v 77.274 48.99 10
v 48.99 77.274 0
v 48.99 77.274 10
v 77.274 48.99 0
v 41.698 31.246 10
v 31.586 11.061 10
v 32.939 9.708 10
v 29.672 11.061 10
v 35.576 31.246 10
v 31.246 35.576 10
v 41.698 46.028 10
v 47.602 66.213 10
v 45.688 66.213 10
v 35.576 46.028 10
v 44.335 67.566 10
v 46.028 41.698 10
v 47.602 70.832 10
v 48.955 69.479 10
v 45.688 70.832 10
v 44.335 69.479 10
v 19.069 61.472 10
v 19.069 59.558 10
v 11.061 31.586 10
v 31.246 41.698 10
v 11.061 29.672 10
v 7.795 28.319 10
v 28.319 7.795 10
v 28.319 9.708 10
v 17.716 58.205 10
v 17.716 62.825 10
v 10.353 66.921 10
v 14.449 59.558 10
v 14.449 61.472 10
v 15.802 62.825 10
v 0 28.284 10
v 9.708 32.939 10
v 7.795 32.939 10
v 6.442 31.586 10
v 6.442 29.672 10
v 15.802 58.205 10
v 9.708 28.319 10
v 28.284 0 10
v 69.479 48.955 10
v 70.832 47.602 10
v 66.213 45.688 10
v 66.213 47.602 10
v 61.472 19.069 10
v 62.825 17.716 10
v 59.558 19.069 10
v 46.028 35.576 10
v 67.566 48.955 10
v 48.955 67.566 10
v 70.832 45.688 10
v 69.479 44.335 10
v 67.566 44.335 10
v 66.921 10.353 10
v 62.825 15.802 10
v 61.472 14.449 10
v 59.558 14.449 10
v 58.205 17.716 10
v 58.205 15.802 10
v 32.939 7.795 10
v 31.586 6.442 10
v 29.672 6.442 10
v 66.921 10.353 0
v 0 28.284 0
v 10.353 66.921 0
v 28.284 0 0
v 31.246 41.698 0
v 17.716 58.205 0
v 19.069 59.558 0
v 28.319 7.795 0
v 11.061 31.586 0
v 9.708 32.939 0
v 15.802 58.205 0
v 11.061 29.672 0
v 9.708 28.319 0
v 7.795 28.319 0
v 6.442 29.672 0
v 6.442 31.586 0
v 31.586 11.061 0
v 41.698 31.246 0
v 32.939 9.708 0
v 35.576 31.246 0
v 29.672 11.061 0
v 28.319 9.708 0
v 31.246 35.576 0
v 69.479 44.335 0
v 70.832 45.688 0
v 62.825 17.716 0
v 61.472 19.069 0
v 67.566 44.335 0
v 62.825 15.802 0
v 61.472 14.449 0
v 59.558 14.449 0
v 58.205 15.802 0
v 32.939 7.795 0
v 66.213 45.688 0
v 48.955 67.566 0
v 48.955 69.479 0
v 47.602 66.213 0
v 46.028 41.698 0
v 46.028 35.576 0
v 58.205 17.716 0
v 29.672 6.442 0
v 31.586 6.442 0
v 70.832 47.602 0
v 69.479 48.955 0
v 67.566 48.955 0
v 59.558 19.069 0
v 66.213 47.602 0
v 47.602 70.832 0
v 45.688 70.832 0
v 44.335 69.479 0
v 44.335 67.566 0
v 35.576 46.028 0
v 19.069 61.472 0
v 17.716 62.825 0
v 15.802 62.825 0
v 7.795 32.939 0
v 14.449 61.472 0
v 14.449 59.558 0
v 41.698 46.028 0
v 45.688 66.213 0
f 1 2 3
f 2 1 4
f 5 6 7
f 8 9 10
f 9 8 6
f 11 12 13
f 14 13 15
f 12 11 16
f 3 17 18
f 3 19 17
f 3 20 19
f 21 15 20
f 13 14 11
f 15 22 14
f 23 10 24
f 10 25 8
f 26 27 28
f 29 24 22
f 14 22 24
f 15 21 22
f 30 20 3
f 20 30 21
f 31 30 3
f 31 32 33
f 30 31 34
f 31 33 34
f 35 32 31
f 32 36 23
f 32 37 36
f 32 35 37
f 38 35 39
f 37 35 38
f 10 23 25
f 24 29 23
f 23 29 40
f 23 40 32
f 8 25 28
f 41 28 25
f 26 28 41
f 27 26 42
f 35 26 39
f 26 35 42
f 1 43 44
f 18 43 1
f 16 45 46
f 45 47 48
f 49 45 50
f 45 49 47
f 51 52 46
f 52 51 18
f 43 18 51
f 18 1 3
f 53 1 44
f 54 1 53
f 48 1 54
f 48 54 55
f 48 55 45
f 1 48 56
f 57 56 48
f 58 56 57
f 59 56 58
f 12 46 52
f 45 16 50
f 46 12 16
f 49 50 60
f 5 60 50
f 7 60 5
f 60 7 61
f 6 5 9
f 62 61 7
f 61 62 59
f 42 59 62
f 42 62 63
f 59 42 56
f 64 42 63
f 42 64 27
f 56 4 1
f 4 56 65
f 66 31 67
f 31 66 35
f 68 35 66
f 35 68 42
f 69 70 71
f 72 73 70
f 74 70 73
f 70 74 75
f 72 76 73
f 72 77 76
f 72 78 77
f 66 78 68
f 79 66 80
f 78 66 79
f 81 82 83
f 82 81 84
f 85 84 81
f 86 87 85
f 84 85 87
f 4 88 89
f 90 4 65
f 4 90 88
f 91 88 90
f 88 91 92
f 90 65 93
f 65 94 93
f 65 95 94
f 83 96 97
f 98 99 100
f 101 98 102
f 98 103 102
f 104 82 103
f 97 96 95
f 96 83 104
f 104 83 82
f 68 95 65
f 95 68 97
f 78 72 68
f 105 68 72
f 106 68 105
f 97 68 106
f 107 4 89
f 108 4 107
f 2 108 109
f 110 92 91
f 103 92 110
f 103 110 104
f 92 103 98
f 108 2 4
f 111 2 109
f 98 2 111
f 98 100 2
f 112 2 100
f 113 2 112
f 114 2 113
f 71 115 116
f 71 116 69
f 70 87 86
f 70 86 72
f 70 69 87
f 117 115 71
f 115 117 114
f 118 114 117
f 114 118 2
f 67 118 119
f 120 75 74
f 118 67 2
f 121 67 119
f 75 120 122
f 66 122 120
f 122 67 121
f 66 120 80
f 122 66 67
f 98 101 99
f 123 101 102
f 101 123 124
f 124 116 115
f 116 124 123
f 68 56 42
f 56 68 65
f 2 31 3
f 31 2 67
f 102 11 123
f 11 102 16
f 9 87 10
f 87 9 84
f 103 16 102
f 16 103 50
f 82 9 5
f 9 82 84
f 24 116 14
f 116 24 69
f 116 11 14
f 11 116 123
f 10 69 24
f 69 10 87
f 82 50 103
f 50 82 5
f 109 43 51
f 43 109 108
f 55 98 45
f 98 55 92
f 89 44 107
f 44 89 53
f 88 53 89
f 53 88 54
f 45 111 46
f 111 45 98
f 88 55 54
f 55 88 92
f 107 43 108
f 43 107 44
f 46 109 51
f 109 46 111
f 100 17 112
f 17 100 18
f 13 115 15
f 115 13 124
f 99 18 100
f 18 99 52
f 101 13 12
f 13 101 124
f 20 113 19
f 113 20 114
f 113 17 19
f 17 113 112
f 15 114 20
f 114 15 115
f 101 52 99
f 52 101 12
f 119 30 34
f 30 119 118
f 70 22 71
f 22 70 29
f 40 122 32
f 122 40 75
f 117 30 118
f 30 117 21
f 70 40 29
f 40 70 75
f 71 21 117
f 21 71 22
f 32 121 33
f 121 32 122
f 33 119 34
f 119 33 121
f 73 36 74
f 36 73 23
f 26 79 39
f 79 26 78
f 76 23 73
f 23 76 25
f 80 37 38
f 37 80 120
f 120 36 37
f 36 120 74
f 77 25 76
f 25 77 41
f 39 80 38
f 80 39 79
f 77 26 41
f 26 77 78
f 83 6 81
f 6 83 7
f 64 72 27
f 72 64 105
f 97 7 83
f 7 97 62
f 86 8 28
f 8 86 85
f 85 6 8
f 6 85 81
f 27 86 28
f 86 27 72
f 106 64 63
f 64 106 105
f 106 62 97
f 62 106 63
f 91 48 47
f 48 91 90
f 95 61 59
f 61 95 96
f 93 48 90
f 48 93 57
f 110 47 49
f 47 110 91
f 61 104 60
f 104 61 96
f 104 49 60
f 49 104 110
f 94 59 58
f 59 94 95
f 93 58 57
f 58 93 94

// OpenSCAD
$fn = 32;

// ----------------------------------------------------------------------
// Polygon plate: 6-gon R40, 6 bolt windows
// ----------------------------------------------------------------------

// --- parameters (mm) ---
sides = 6;                // number of polygon sides
plate_r = 40;             // circumscribed radius of the polygon
bore_r = 8;               // centre bore radius
bolts = 6;                // number of bolt windows
ring_r = 30.94;           // bolt-circle radius
bolt_r = 2.5;             // bolt window radius
plate_t = 10;             // plate thickness, Z (extrusion height)

plate_d = 2 * plate_r;  // circumscribed diameter
bore_d = 2 * bore_r;  // centre bore diameter
bolt_d = 2 * bolt_r;  // bolt window diameter
ring_d = 2 * ring_r;  // bolt-circle diameter

profile = [[77.274, 48.99], [48.99, 77.274], [10.353, 66.921], [0, 28.284], [28.284, 0], [66.921, 10.353]];  // primary outline, 6 points, counter clockwise
void_1 = [[46.028, 41.698], [41.698, 46.028], [35.576, 46.028], [31.246, 41.698], [31.246, 35.576], [35.576, 31.246], [41.698, 31.246], [46.028, 35.576]];  // centre bore, 8 points
void_2 = [[70.832, 47.602], [69.479, 48.955], [67.566, 48.955], [66.213, 47.602], [66.213, 45.688], [67.566, 44.335], [69.479, 44.335], [70.832, 45.688]];  // bolt window 1, 8 points
void_3 = [[48.955, 69.479], [47.602, 70.832], [45.688, 70.832], [44.335, 69.479], [44.335, 67.566], [45.688, 66.213], [47.602, 66.213], [48.955, 67.566]];  // bolt window 2, 8 points
void_4 = [[19.069, 61.472], [17.716, 62.825], [15.802, 62.825], [14.449, 61.472], [14.449, 59.558], [15.802, 58.205], [17.716, 58.205], [19.069, 59.558]];  // bolt window 3, 8 points
void_5 = [[11.061, 31.586], [9.708, 32.939], [7.795, 32.939], [6.442, 31.586], [6.442, 29.672], [7.795, 28.319], [9.708, 28.319], [11.061, 29.672]];  // bolt window 4, 8 points
void_6 = [[32.939, 9.708], [31.586, 11.061], [29.672, 11.061], [28.319, 9.708], [28.319, 7.795], [29.672, 6.442], [31.586, 6.442], [32.939, 7.795]];  // bolt window 5, 8 points
void_7 = [[62.825, 17.716], [61.472, 19.069], [59.558, 19.069], [58.205, 17.716], [58.205, 15.802], [59.558, 14.449], [61.472, 14.449], [62.825, 15.802]];  // bolt window 6, 8 points

// --- the one profile operation ---
difference() {
  linear_extrude(height = plate_t) polygon(points = profile);
  translate([0, 0, -1])
    linear_extrude(height = plate_t + 2) polygon(points = void_1);
  translate([0, 0, -1])
    linear_extrude(height = plate_t + 2) polygon(points = void_2);
  translate([0, 0, -1])
    linear_extrude(height = plate_t + 2) polygon(points = void_3);
  translate([0, 0, -1])
    linear_extrude(height = plate_t + 2) polygon(points = void_4);
  translate([0, 0, -1])
    linear_extrude(height = plate_t + 2) polygon(points = void_5);
  translate([0, 0, -1])
    linear_extrude(height = plate_t + 2) polygon(points = void_6);
  translate([0, 0, -1])
    linear_extrude(height = plate_t + 2) polygon(points = void_7);
}
